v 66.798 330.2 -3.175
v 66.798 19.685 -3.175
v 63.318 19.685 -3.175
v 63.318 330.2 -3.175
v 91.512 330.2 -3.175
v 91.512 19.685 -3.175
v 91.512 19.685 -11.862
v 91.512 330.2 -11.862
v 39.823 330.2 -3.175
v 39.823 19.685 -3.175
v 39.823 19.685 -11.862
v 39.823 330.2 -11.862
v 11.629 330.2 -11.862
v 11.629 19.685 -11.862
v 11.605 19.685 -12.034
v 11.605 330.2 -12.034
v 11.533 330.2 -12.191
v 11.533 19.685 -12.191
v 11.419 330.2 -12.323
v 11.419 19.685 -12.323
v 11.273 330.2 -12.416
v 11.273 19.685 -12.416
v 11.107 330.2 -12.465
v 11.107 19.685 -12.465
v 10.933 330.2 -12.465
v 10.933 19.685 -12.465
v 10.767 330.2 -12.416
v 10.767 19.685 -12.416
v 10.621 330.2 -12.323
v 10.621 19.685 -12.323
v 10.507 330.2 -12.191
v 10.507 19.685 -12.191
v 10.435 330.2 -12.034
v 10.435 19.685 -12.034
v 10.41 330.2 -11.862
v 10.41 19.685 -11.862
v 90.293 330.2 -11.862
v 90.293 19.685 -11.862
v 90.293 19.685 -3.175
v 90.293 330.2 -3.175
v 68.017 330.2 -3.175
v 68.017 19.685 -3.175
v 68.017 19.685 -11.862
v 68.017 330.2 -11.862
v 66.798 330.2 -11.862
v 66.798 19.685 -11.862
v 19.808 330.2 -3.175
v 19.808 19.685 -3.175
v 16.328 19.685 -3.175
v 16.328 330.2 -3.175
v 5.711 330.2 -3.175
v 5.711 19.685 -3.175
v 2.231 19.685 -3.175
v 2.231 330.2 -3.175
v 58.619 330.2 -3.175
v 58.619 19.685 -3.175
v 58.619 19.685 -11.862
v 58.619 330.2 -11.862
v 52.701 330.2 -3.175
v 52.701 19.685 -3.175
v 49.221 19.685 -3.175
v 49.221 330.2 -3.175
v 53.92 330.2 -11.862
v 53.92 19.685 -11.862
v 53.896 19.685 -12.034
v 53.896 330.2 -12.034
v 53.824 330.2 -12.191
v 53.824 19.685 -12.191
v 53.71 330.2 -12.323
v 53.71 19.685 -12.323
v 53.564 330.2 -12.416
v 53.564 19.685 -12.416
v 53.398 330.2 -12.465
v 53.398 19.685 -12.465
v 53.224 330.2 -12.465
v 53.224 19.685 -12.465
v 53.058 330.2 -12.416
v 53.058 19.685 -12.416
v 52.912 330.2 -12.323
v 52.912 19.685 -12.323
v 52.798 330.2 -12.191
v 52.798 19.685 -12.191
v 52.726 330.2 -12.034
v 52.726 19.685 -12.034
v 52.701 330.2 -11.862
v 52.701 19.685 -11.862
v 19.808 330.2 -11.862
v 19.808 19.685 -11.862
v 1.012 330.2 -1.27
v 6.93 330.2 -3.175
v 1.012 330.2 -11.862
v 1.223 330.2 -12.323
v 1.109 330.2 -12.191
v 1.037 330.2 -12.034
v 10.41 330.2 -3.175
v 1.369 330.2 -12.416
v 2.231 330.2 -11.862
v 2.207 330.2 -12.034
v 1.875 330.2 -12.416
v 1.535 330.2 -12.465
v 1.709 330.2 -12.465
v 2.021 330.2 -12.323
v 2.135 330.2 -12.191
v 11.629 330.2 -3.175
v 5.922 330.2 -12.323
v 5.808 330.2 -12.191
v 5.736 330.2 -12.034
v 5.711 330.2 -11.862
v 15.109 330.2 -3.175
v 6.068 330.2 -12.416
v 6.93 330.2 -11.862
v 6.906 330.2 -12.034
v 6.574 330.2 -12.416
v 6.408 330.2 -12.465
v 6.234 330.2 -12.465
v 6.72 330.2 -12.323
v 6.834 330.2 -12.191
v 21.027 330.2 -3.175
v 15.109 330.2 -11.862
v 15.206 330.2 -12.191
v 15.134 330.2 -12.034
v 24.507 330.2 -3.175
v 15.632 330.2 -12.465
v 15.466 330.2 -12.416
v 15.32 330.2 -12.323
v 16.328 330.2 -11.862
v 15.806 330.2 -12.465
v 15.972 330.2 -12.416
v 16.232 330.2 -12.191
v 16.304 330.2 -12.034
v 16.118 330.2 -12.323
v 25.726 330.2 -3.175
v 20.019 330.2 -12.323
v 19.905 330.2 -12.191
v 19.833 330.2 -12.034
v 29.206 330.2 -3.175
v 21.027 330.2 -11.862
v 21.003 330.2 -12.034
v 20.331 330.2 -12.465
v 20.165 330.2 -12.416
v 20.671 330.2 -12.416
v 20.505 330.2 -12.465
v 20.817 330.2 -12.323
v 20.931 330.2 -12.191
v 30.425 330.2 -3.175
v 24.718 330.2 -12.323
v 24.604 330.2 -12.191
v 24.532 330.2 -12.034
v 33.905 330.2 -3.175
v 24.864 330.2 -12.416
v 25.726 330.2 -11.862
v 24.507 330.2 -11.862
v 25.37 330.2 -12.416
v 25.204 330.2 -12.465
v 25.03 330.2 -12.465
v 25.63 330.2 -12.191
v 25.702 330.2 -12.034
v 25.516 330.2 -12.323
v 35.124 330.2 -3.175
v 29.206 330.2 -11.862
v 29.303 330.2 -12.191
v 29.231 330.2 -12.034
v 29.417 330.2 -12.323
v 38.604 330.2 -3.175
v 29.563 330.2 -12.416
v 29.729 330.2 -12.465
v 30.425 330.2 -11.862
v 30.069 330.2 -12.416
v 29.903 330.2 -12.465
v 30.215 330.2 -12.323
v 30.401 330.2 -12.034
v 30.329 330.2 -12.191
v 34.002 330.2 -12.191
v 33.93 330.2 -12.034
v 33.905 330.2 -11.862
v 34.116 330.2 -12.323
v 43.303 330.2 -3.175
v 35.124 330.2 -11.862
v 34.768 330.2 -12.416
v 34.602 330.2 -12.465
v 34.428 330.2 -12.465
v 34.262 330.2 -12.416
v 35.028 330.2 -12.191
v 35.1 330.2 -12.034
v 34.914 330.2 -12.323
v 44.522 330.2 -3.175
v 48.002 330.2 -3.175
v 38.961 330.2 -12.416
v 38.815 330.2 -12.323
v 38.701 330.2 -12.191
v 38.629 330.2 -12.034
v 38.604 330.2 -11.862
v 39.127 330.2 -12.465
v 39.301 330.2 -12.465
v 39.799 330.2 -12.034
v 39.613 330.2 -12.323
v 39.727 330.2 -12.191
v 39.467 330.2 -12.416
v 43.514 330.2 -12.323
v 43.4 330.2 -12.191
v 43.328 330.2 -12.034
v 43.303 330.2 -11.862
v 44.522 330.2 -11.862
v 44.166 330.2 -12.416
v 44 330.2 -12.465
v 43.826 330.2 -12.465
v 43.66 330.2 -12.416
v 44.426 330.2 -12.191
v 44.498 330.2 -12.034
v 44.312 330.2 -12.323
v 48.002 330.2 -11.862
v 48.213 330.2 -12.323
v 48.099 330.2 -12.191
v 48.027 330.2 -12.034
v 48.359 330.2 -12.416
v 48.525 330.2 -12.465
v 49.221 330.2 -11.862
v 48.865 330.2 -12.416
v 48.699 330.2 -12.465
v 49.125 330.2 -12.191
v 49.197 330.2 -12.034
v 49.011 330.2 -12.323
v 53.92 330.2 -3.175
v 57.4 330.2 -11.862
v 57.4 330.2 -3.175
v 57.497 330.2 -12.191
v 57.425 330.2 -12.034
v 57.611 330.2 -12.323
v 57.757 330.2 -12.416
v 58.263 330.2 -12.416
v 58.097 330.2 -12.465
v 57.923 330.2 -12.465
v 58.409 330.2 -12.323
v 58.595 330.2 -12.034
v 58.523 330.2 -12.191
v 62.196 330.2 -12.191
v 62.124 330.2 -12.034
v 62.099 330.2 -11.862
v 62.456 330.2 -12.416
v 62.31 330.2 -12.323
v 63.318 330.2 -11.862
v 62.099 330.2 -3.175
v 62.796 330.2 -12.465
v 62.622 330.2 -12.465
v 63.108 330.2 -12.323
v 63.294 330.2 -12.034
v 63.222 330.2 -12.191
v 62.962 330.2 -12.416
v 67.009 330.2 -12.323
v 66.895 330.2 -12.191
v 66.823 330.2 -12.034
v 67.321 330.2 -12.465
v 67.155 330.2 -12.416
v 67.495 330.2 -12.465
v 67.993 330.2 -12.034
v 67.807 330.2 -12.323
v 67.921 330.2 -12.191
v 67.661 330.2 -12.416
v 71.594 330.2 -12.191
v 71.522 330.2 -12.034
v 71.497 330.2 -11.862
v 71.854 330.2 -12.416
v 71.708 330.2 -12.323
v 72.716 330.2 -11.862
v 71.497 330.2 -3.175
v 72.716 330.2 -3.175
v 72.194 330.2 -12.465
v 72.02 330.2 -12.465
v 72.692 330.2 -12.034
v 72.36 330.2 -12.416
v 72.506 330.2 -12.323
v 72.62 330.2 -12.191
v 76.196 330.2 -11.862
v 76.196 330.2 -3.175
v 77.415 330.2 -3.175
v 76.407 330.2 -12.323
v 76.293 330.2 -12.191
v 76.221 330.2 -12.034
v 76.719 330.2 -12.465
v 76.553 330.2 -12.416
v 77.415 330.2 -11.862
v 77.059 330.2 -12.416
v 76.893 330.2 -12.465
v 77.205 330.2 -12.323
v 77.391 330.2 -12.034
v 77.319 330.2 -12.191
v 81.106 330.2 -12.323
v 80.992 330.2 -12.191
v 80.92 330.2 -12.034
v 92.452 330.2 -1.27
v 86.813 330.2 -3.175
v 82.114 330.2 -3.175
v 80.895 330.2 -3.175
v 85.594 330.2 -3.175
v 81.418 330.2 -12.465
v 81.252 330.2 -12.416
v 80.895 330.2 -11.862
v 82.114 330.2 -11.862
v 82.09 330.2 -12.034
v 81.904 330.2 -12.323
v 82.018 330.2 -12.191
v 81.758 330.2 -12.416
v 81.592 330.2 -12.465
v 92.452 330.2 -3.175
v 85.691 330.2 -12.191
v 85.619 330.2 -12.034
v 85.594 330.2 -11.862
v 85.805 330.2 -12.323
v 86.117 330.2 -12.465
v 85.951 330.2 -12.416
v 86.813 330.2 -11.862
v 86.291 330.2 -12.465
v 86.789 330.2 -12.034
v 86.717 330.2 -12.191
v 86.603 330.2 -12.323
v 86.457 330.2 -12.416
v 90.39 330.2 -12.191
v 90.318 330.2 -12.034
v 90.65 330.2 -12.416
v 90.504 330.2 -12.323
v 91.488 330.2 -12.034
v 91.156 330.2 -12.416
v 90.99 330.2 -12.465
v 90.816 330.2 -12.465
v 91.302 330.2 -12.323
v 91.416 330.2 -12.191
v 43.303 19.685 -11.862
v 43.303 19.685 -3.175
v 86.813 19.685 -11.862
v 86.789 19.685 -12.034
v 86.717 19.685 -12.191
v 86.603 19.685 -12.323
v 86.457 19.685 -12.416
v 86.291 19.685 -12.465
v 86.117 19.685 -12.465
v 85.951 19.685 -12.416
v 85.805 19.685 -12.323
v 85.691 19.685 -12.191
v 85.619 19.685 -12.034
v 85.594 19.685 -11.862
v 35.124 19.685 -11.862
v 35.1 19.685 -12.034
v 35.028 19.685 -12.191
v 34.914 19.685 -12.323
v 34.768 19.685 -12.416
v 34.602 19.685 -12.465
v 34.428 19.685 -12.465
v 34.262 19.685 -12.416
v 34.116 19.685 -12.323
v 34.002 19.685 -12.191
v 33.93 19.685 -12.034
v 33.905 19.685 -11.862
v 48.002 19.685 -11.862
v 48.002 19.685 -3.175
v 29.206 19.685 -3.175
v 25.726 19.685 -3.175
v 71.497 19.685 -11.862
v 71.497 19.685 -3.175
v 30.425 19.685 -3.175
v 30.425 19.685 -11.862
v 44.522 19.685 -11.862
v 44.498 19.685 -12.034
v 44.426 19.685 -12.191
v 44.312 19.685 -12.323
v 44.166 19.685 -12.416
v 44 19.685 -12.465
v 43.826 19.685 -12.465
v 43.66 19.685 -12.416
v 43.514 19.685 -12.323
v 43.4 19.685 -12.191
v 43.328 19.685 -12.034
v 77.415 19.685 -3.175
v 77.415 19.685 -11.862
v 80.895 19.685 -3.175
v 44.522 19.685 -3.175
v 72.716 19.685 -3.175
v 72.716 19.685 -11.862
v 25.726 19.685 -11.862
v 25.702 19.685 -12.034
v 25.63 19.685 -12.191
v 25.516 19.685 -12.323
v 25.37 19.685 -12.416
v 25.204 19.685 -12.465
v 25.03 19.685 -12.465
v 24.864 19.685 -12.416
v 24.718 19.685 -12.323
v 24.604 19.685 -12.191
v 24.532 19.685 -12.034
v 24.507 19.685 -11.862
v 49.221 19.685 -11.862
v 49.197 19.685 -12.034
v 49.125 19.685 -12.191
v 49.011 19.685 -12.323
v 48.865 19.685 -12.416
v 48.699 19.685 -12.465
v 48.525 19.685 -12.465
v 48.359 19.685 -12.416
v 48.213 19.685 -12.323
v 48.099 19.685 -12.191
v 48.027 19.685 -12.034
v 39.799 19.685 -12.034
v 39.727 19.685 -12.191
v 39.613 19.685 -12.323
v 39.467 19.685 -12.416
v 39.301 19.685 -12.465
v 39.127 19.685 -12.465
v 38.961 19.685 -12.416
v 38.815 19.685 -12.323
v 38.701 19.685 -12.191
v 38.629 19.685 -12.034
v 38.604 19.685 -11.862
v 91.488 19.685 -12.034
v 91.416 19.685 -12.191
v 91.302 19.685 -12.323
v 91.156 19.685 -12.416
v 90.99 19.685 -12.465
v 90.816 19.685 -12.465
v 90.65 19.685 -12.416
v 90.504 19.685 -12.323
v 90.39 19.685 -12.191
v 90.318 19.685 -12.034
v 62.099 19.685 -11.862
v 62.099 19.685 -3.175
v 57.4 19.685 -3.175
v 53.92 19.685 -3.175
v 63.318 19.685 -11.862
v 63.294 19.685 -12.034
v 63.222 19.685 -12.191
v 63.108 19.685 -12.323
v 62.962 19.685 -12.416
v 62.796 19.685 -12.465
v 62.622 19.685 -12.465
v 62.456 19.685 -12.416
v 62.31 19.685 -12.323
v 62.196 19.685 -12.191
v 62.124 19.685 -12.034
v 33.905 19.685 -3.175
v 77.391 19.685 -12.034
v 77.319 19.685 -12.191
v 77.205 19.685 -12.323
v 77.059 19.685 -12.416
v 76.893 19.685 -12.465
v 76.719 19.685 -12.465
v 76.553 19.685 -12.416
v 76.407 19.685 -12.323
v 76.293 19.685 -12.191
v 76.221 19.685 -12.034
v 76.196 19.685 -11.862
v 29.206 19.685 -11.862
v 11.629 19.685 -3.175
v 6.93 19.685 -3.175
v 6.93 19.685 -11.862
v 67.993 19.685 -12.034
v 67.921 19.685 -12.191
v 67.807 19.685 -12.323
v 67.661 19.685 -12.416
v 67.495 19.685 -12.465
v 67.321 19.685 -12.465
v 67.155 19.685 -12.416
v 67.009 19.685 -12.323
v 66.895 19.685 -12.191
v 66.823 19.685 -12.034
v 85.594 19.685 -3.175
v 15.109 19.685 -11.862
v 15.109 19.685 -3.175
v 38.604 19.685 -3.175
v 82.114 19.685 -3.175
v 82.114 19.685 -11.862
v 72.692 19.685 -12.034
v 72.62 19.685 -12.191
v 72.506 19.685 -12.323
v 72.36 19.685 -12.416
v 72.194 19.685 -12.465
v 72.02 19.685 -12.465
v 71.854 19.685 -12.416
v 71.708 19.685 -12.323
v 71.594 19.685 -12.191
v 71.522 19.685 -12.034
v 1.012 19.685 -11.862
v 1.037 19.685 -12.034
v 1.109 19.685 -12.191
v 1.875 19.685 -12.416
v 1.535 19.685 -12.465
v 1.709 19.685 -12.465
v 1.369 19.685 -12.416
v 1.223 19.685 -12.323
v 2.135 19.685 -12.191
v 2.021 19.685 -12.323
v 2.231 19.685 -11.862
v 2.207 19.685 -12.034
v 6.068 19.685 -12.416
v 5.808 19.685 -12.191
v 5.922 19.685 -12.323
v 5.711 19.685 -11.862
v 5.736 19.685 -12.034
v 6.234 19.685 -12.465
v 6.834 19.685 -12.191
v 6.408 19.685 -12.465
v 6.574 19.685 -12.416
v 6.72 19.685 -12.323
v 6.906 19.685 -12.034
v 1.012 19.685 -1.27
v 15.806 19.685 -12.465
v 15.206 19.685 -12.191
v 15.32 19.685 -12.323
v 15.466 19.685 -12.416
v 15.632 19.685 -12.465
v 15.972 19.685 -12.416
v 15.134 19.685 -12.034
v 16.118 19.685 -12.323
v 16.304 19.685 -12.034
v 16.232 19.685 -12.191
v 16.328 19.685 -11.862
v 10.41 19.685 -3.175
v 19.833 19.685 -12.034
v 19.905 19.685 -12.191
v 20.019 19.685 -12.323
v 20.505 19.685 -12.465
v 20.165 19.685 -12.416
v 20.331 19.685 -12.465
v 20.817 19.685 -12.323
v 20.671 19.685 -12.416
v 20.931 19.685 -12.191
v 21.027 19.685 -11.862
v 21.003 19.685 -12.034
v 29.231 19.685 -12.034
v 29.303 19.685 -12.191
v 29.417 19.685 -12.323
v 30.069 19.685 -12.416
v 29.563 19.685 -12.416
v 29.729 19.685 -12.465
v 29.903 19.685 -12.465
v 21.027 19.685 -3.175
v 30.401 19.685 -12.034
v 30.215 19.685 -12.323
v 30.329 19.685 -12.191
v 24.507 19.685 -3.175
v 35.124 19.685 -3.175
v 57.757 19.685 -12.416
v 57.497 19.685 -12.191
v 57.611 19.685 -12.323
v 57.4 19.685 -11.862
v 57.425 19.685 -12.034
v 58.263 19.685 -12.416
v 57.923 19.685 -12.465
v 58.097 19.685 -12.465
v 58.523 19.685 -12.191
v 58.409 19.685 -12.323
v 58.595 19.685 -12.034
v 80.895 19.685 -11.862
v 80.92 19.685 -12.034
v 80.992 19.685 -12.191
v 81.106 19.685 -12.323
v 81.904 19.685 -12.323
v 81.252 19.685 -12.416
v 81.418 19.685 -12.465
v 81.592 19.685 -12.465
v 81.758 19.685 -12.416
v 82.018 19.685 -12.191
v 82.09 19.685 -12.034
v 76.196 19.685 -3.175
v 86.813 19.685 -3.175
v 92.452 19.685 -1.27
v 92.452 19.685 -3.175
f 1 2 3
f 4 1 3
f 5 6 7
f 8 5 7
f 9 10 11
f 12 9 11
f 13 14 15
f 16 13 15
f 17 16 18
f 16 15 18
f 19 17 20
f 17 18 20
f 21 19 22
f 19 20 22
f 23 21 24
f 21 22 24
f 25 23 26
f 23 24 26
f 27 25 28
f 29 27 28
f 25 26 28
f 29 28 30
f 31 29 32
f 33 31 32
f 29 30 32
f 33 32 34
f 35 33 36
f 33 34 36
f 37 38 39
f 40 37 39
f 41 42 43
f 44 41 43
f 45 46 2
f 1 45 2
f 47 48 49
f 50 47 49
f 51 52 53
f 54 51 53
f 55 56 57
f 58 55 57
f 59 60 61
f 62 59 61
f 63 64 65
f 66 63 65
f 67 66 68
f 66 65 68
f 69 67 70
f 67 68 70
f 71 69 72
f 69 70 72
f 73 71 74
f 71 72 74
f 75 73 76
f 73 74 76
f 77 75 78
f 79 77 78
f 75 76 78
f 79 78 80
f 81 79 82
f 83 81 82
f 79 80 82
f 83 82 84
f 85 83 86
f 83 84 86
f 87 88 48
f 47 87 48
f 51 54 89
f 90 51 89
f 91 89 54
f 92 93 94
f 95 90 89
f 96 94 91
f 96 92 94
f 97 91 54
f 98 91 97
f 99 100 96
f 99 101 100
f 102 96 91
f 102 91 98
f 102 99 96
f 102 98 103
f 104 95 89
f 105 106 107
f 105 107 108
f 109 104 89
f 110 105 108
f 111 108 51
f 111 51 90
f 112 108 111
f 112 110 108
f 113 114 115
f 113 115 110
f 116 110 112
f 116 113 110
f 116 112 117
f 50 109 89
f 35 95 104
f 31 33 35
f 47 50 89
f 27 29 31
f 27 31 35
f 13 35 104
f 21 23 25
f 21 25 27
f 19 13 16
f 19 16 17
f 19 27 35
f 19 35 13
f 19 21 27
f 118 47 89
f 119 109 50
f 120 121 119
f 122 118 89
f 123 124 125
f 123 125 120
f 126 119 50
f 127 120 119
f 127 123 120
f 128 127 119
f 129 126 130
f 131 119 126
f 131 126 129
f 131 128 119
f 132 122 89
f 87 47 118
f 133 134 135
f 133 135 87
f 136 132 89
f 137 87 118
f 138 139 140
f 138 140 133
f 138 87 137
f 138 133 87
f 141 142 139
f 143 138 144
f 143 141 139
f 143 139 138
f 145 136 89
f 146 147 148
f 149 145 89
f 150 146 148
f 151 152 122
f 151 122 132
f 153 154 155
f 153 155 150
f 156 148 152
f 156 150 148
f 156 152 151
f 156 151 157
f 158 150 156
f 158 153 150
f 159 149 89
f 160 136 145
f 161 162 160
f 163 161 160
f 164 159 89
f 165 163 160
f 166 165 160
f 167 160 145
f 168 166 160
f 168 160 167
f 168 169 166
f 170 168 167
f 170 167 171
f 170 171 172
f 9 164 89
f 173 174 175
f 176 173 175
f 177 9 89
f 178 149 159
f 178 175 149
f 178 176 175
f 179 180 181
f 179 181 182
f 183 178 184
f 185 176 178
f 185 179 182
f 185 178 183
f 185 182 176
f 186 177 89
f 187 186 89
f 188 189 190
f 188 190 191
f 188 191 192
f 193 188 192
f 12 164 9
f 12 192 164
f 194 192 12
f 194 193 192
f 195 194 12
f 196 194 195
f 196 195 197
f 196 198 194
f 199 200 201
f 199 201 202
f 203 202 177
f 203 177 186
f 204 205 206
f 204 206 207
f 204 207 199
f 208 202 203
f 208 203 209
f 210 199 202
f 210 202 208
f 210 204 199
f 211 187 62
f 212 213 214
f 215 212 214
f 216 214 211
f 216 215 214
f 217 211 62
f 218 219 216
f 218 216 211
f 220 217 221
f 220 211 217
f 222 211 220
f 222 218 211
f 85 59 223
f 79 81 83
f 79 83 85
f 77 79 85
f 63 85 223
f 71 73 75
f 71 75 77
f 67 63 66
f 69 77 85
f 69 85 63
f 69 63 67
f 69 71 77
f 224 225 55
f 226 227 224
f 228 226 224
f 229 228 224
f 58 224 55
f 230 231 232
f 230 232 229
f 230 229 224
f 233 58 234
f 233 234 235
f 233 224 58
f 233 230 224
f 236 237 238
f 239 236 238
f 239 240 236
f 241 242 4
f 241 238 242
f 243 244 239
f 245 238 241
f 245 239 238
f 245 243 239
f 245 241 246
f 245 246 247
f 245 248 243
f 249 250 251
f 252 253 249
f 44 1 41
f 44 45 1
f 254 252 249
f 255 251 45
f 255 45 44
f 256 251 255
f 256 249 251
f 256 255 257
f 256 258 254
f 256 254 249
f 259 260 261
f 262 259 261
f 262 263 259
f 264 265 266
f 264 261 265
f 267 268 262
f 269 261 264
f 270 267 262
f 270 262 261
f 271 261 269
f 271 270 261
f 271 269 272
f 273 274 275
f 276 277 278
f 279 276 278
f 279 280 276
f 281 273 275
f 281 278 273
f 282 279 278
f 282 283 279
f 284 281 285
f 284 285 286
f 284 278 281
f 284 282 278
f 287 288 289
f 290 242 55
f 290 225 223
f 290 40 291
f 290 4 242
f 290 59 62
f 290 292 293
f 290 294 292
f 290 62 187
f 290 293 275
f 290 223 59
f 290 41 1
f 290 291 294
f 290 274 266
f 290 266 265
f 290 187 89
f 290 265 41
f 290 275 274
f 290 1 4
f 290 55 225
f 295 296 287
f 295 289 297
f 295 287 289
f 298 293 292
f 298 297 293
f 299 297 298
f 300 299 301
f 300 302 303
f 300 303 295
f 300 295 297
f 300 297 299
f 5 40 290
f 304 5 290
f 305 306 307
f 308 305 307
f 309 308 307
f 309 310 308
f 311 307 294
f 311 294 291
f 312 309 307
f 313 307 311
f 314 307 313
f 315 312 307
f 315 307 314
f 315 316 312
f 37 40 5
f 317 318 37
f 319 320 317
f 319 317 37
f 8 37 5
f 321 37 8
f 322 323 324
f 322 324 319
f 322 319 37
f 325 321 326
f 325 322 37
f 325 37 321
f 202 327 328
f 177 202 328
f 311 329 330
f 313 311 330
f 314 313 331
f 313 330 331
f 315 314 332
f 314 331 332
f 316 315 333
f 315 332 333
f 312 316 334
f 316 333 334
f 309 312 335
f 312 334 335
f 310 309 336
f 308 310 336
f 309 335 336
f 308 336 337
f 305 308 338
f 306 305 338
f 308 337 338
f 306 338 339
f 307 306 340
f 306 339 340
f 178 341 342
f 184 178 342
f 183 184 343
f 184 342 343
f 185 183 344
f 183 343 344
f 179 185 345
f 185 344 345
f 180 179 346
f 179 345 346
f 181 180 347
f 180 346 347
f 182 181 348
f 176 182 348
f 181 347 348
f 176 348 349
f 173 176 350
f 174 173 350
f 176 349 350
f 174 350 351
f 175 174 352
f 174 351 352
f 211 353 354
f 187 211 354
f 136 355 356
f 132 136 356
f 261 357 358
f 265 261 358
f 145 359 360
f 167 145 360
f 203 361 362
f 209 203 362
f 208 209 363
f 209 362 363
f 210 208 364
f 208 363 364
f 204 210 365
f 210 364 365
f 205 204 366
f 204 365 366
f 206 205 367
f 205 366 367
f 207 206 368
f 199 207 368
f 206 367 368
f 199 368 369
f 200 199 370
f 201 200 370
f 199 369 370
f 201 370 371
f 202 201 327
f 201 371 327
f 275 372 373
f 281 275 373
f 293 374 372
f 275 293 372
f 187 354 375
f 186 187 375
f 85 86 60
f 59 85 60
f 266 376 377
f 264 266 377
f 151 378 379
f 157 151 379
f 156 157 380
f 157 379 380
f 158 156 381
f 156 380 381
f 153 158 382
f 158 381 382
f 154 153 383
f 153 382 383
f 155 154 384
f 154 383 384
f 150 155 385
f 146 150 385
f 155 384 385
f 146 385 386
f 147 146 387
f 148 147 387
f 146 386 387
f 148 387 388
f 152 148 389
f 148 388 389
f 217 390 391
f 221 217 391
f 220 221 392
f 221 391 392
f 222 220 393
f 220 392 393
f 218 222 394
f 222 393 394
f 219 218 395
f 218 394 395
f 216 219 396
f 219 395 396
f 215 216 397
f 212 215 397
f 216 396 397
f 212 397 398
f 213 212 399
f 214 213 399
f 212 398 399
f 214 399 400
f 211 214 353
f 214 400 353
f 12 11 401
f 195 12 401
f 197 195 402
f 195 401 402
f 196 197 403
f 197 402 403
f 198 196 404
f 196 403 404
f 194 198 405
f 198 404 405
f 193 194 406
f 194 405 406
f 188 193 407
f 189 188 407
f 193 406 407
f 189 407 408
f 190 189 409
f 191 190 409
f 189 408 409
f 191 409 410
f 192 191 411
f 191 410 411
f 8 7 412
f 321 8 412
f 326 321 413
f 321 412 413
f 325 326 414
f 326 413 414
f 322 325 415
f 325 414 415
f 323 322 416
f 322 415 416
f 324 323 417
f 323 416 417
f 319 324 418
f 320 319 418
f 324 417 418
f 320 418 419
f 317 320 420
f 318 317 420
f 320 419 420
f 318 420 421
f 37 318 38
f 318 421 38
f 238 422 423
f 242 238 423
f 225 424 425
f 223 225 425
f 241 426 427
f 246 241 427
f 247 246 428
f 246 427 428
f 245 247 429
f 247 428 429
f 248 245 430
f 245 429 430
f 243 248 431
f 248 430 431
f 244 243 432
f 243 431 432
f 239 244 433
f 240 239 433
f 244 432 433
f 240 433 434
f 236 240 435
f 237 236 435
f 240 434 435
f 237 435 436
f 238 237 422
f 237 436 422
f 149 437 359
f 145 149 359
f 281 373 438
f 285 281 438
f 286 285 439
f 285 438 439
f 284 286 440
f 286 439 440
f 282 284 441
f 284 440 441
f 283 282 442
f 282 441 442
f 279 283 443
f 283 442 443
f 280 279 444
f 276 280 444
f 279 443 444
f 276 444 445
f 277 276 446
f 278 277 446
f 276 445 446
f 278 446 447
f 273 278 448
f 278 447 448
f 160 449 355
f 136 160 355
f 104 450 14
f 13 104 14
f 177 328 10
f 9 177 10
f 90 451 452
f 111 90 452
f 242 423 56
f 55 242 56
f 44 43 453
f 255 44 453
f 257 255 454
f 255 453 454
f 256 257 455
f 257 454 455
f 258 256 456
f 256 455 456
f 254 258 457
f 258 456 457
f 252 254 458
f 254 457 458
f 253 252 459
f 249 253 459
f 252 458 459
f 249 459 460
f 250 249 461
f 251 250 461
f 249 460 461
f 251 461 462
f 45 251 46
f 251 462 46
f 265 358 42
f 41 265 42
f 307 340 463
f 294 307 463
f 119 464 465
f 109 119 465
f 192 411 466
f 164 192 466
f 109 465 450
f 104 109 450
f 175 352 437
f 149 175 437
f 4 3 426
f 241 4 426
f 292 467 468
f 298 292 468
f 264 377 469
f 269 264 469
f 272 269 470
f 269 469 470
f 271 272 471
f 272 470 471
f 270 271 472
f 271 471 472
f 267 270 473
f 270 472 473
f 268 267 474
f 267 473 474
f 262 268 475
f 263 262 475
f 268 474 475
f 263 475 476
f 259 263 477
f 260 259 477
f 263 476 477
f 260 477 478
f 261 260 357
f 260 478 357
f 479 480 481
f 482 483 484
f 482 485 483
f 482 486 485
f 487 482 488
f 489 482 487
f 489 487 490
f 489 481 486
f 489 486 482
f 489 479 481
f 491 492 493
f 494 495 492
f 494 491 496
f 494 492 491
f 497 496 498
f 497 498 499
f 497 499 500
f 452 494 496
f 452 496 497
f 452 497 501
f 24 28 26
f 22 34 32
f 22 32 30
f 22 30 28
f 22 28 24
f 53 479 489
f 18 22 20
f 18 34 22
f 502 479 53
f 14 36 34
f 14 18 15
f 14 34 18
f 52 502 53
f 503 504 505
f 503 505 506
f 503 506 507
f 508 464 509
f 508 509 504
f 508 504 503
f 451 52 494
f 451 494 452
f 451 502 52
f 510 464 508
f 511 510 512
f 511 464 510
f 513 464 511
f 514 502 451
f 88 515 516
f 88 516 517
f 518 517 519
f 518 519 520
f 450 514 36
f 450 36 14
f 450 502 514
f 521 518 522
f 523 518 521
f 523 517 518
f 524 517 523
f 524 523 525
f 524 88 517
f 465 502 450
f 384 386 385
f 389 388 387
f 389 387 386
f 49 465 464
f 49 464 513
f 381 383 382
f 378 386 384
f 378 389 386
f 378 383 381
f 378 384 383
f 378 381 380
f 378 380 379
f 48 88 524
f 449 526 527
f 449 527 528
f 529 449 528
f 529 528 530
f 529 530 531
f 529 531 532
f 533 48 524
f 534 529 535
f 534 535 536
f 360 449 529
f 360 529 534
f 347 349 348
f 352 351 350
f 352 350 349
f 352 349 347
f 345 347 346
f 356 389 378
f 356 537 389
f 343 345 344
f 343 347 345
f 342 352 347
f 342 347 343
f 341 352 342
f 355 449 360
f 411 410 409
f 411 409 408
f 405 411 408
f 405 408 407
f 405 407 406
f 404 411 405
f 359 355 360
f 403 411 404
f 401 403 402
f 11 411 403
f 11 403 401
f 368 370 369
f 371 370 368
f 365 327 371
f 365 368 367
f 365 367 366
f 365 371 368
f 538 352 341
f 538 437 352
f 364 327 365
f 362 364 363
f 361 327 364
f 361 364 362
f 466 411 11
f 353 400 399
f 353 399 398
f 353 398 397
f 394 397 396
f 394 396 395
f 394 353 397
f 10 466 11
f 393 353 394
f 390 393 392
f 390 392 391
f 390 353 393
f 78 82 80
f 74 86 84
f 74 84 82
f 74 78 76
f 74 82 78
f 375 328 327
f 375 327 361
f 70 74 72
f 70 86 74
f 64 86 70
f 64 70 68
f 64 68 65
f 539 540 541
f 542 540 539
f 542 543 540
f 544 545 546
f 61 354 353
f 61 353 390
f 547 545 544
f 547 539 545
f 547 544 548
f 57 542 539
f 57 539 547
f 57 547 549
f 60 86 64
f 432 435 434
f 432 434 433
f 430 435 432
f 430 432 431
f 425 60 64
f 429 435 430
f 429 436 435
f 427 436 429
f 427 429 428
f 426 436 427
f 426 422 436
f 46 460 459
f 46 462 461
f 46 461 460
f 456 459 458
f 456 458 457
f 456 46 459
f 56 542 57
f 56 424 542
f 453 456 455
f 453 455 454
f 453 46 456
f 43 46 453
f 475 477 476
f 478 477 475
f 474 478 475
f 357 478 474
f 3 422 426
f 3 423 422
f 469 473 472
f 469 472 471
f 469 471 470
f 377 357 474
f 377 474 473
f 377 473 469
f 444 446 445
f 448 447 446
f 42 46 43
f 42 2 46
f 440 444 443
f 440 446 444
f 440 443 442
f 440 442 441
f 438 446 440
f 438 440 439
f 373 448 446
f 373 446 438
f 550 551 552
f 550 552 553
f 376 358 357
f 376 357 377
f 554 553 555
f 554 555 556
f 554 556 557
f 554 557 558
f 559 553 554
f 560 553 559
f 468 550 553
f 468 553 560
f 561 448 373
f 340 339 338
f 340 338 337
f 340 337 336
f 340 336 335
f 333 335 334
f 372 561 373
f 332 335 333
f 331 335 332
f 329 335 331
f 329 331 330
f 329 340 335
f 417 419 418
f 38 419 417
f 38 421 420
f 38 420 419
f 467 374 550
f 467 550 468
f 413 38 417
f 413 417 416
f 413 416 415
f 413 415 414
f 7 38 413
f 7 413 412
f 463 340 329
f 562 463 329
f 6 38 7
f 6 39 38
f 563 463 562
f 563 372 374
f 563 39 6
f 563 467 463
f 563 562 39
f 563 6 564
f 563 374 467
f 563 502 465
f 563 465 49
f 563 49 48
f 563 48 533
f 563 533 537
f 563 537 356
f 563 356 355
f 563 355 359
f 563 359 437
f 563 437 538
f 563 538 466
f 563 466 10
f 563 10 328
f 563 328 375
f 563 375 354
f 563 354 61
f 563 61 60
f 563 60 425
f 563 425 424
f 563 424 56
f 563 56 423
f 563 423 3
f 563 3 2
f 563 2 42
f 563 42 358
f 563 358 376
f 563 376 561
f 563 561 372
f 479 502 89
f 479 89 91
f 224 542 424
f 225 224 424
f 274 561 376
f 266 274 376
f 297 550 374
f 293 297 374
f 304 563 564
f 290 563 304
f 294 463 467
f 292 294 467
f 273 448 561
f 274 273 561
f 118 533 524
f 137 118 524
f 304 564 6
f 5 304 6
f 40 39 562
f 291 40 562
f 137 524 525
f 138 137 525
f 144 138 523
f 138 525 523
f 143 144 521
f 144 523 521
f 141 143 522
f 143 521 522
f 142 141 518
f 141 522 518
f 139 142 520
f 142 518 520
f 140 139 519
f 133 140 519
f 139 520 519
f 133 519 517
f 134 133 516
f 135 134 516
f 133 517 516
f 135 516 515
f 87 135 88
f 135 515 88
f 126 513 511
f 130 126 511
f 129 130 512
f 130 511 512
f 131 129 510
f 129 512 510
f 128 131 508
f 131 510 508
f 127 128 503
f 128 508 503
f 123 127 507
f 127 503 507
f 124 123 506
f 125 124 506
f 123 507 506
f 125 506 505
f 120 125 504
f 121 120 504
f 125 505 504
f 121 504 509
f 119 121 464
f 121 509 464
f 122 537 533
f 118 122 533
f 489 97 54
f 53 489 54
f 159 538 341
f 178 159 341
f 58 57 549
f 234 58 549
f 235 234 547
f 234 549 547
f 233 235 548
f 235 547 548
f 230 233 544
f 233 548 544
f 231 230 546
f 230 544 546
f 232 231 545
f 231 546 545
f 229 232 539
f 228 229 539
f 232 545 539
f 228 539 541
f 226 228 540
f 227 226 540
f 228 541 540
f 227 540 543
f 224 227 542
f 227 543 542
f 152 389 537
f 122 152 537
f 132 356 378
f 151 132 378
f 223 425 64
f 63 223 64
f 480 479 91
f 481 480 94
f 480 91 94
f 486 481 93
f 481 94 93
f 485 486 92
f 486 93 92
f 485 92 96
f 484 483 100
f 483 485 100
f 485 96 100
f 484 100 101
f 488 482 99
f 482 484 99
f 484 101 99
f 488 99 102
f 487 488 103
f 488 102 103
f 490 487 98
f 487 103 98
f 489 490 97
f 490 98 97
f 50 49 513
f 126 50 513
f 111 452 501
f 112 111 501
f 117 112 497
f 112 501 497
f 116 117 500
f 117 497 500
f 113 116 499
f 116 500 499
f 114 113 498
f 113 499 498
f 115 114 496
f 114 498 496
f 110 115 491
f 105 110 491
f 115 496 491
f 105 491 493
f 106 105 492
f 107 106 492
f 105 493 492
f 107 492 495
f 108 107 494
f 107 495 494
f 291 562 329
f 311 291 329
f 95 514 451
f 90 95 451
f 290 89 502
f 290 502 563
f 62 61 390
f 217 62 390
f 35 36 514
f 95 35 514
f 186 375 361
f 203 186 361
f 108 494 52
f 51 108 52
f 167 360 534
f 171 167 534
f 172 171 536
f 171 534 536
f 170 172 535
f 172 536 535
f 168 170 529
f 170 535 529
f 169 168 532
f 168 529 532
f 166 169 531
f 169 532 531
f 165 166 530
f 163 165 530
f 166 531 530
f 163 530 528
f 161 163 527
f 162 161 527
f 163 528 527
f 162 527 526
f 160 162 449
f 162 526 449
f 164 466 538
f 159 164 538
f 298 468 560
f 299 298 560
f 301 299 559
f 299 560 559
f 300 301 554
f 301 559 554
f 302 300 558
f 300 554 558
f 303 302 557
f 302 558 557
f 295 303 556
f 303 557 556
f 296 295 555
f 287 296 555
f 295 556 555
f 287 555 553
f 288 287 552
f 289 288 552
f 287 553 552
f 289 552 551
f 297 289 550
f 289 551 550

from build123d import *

# Parameters (mm, degrees)
BOSS_EXTRUDE1_DEPTH   = 330.2
BOSS_EXTRUDE2_DEPTH   = 330.2
SKETCH_PATTERN1_DEPTH = 330.2
SKETCH5_W             = 0.4826
SKETCH5_H             = 3.175
BOSS_EXTRUDE3_DEPTH   = 254
SKETCH10_OUTSIDE_W    = 282.866
SKETCH10_OUTSIDE_H    = 409.79
SKETCH10_OUTSIDE_W_2  = 91.44
SKETCH10_OUTSIDE_H_2  = 330.2
CUT_EXTRUDE3_DEPTH    = 389.485949469
SKETCH11_OUTSIDE_W    = 162.01
SKETCH11_OUTSIDE_H    = 400.77
SKETCH11_OUTSIDE_W_2  = 91.44
SKETCH11_OUTSIDE_H_2  = 310.515
CUT_EXTRUDE4_DEPTH    = 344.125324268
SKETCH12_W            = 91.44
SKETCH12_H            = 310.515
CUT_EXTRUDE5_DEPTH    = 1.27


# Read off the part's stored shape, not the designer's step: Sketch-Pattern1
with BuildPart() as part:
    # Sketch1 → Boss-Extrude1 (new body)
    with BuildSketch(Plane(origin=(0, 0, 0), x_dir=(1, 0, 0), z_dir=(0, 1, 0))):
        Polygon((1.012216501, 3.175), (1.012216501, 0), (203.805816501, 0), (203.805816501, 3.175), (2.231416501, 3.175), align=None)
    extrude(amount=BOSS_EXTRUDE1_DEPTH)

    # Sketch3 → Boss-Extrude2 (add, through all)
    with BuildSketch(Plane(origin=(0, 330.2, 0), x_dir=(1, 0, 0), z_dir=(0, 1, 0))):
        with BuildLine():
            Line((1.012216501, 3.175), (1.012216501, 11.8618))
            ThreePointArc((1.012216501, 11.8618), (1.621816501, 12.4714), (2.231416501, 11.8618))
            Line((2.231416501, 11.8618), (2.231416501, 3.175))
            Line((2.231416501, 3.175), (1.012216501, 3.175))
        make_face()
    extrude(amount=-BOSS_EXTRUDE2_DEPTH)

    # Sketch-Pattern1 outline → Sketch-Pattern1 (add)
    with BuildSketch(Plane(origin=(0, 0, 0), x_dir=(1, 0, 0), z_dir=(0, 1, 0))):
        with BuildLine():
            Line((6.930416501, 3.175), (6.930416501, 11.8618))
            ThreePointArc((6.930416501, 11.8618), (6.320816501, 12.4714), (5.711216501, 11.8618))
            Line((5.711216501, 11.8618), (5.711216501, 3.175))
            Line((5.711216501, 3.175), (6.930416501, 3.175))
        make_face()
        with BuildLine():
            Line((203.069216501, 11.8618), (203.069216501, 3.175))
            Line((203.069216501, 3.175), (204.288416501, 3.175))
            Line((204.288416501, 3.175), (204.288416501, 11.8618))
            ThreePointArc((204.288416501, 11.8618), (203.678816501, 12.4714), (203.069216501, 11.8618))
        make_face()
        with BuildLine():
            Line((198.370216501, 11.8618), (198.370216501, 3.175))
            Line((198.370216501, 3.175), (199.589416501, 3.175))
            Line((199.589416501, 3.175), (199.589416501, 11.8618))
            ThreePointArc((199.589416501, 11.8618), (198.979816501, 12.4714), (198.370216501, 11.8618))
        make_face()
        with BuildLine():
            Line((193.671216501, 11.8618), (193.671216501, 3.175))
            Line((193.671216501, 3.175), (194.890416501, 3.175))
            Line((194.890416501, 3.175), (194.890416501, 11.8618))
            ThreePointArc((194.890416501, 11.8618), (194.280816501, 12.4714), (193.671216501, 11.8618))
        make_face()
        with BuildLine():
            Line((188.972216501, 11.8618), (188.972216501, 3.175))
            Line((188.972216501, 3.175), (190.191416501, 3.175))
            Line((190.191416501, 3.175), (190.191416501, 11.8618))
            ThreePointArc((190.191416501, 11.8618), (189.581816501, 12.4714), (188.972216501, 11.8618))
        make_face()
        with BuildLine():
            Line((184.273216501, 11.8618), (184.273216501, 3.175))
            Line((184.273216501, 3.175), (185.492416501, 3.175))
            Line((185.492416501, 3.175), (185.492416501, 11.8618))
            ThreePointArc((185.492416501, 11.8618), (184.882816501, 12.4714), (184.273216501, 11.8618))
        make_face()
        with BuildLine():
            Line((179.574216501, 11.8618), (179.574216501, 3.175))
            Line((179.574216501, 3.175), (180.793416501, 3.175))
            Line((180.793416501, 3.175), (180.793416501, 11.8618))
            ThreePointArc((180.793416501, 11.8618), (180.183816501, 12.4714), (179.574216501, 11.8618))
        make_face()
        with BuildLine():
            Line((174.875216501, 11.8618), (174.875216501, 3.175))
            Line((174.875216501, 3.175), (176.094416501, 3.175))
            Line((176.094416501, 3.175), (176.094416501, 11.8618))
            ThreePointArc((176.094416501, 11.8618), (175.484816501, 12.4714), (174.875216501, 11.8618))
        make_face()
        with BuildLine():
            Line((170.176216501, 11.8618), (170.176216501, 3.175))
            Line((170.176216501, 3.175), (171.395416501, 3.175))
            Line((171.395416501, 3.175), (171.395416501, 11.8618))
            ThreePointArc((171.395416501, 11.8618), (170.785816501, 12.4714), (170.176216501, 11.8618))
        make_face()
        with BuildLine():
            Line((165.477216501, 11.8618), (165.477216501, 3.175))
            Line((165.477216501, 3.175), (166.696416501, 3.175))
            Line((166.696416501, 3.175), (166.696416501, 11.8618))
            ThreePointArc((166.696416501, 11.8618), (166.086816501, 12.4714), (165.477216501, 11.8618))
        make_face()
        with BuildLine():
            Line((160.778216501, 11.8618), (160.778216501, 3.175))
            Line((160.778216501, 3.175), (161.997416501, 3.175))
            Line((161.997416501, 3.175), (161.997416501, 11.8618))
            ThreePointArc((161.997416501, 11.8618), (161.387816501, 12.4714), (160.778216501, 11.8618))
        make_face()
        with BuildLine():
            Line((156.079216501, 11.8618), (156.079216501, 3.175))
            Line((156.079216501, 3.175), (157.298416501, 3.175))
            Line((157.298416501, 3.175), (157.298416501, 11.8618))
            ThreePointArc((157.298416501, 11.8618), (156.688816501, 12.4714), (156.079216501, 11.8618))
        make_face()
        with BuildLine():
            Line((151.380216501, 11.8618), (151.380216501, 3.175))
            Line((151.380216501, 3.175), (152.599416501, 3.175))
            Line((152.599416501, 3.175), (152.599416501, 11.8618))
            ThreePointArc((152.599416501, 11.8618), (151.989816501, 12.4714), (151.380216501, 11.8618))
        make_face()
        with BuildLine():
            Line((146.681216501, 11.8618), (146.681216501, 3.175))
            Line((146.681216501, 3.175), (147.900416501, 3.175))
            Line((147.900416501, 3.175), (147.900416501, 11.8618))
            ThreePointArc((147.900416501, 11.8618), (147.290816501, 12.4714), (146.681216501, 11.8618))
        make_face()
        with BuildLine():
            Line((141.982216501, 11.8618), (141.982216501, 3.175))
            Line((141.982216501, 3.175), (143.201416501, 3.175))
            Line((143.201416501, 3.175), (143.201416501, 11.8618))
            ThreePointArc((143.201416501, 11.8618), (142.591816501, 12.4714), (141.982216501, 11.8618))
        make_face()
        with BuildLine():
            Line((137.283216501, 11.8618), (137.283216501, 3.175))
            Line((137.283216501, 3.175), (138.502416501, 3.175))
            Line((138.502416501, 3.175), (138.502416501, 11.8618))
            ThreePointArc((138.502416501, 11.8618), (137.892816501, 12.4714), (137.283216501, 11.8618))
        make_face()
        with BuildLine():
            Line((132.584216501, 11.8618), (132.584216501, 3.175))
            Line((132.584216501, 3.175), (133.803416501, 3.175))
            Line((133.803416501, 3.175), (133.803416501, 11.8618))
            ThreePointArc((133.803416501, 11.8618), (133.193816501, 12.4714), (132.584216501, 11.8618))
        make_face()
        with BuildLine():
            Line((127.885216501, 11.8618), (127.885216501, 3.175))
            Line((127.885216501, 3.175), (129.104416501, 3.175))
            Line((129.104416501, 3.175), (129.104416501, 11.8618))
            ThreePointArc((129.104416501, 11.8618), (128.494816501, 12.4714), (127.885216501, 11.8618))
        make_face()
        with BuildLine():
            Line((123.186216501, 11.8618), (123.186216501, 3.175))
            Line((123.186216501, 3.175), (124.405416501, 3.175))
            Line((124.405416501, 3.175), (124.405416501, 11.8618))
            ThreePointArc((124.405416501, 11.8618), (123.795816501, 12.4714), (123.186216501, 11.8618))
        make_face()
        with BuildLine():
            Line((118.487216501, 11.8618), (118.487216501, 3.175))
            Line((118.487216501, 3.175), (119.706416501, 3.175))
            Line((119.706416501, 3.175), (119.706416501, 11.8618))
            ThreePointArc((119.706416501, 11.8618), (119.096816501, 12.4714), (118.487216501, 11.8618))
        make_face()
        with BuildLine():
            Line((113.788216501, 11.8618), (113.788216501, 3.175))
            Line((113.788216501, 3.175), (115.007416501, 3.175))
            Line((115.007416501, 3.175), (115.007416501, 11.8618))
            ThreePointArc((115.007416501, 11.8618), (114.397816501, 12.4714), (113.788216501, 11.8618))
        make_face()
        with BuildLine():
            Line((109.089216501, 11.8618), (109.089216501, 3.175))
            Line((109.089216501, 3.175), (110.308416501, 3.175))
            Line((110.308416501, 3.175), (110.308416501, 11.8618))
            ThreePointArc((110.308416501, 11.8618), (109.698816501, 12.4714), (109.089216501, 11.8618))
        make_face()
        with BuildLine():
            Line((104.390216501, 11.8618), (104.390216501, 3.175))
            Line((104.390216501, 3.175), (105.609416501, 3.175))
            Line((105.609416501, 3.175), (105.609416501, 11.8618))
            ThreePointArc((105.609416501, 11.8618), (104.999816501, 12.4714), (104.390216501, 11.8618))
        make_face()
        with BuildLine():
            Line((99.691216501, 11.8618), (99.691216501, 3.175))
            Line((99.691216501, 3.175), (100.910416501, 3.175))
            Line((100.910416501, 3.175), (100.910416501, 11.8618))
            ThreePointArc((100.910416501, 11.8618), (100.300816501, 12.4714), (99.691216501, 11.8618))
        make_face()
        with BuildLine():
            Line((94.992216501, 11.8618), (94.992216501, 3.175))
            Line((94.992216501, 3.175), (96.211416501, 3.175))
            Line((96.211416501, 3.175), (96.211416501, 11.8618))
            ThreePointArc((96.211416501, 11.8618), (95.601816501, 12.4714), (94.992216501, 11.8618))
        make_face()
        with BuildLine():
            Line((90.293216501, 11.8618), (90.293216501, 3.175))
            Line((90.293216501, 3.175), (91.512416501, 3.175))
            Line((91.512416501, 3.175), (91.512416501, 11.8618))
            ThreePointArc((91.512416501, 11.8618), (90.902816501, 12.4714), (90.293216501, 11.8618))
        make_face()
        with BuildLine():
            Line((85.594216501, 11.8618), (85.594216501, 3.175))
            Line((85.594216501, 3.175), (86.813416501, 3.175))
            Line((86.813416501, 3.175), (86.813416501, 11.8618))
            ThreePointArc((86.813416501, 11.8618), (86.203816501, 12.4714), (85.594216501, 11.8618))
        make_face()
        with BuildLine():
            Line((80.895216501, 11.8618), (80.895216501, 3.175))
            Line((80.895216501, 3.175), (82.114416501, 3.175))
            Line((82.114416501, 3.175), (82.114416501, 11.8618))
            ThreePointArc((82.114416501, 11.8618), (81.504816501, 12.4714), (80.895216501, 11.8618))
        make_face()
        with BuildLine():
            Line((76.196216501, 11.8618), (76.196216501, 3.175))
            Line((76.196216501, 3.175), (77.415416501, 3.175))
            Line((77.415416501, 3.175), (77.415416501, 11.8618))
            ThreePointArc((77.415416501, 11.8618), (76.805816501, 12.4714), (76.196216501, 11.8618))
        make_face()
        with BuildLine():
            Line((71.497216501, 11.8618), (71.497216501, 3.175))
            Line((71.497216501, 3.175), (72.716416501, 3.175))
            Line((72.716416501, 3.175), (72.716416501, 11.8618))
            ThreePointArc((72.716416501, 11.8618), (72.106816501, 12.4714), (71.497216501, 11.8618))
        make_face()
        with BuildLine():
            Line((66.798216501, 11.8618), (66.798216501, 3.175))
            Line((66.798216501, 3.175), (68.017416501, 3.175))
            Line((68.017416501, 3.175), (68.017416501, 11.8618))
            ThreePointArc((68.017416501, 11.8618), (67.407816501, 12.4714), (66.798216501, 11.8618))
        make_face()
        with BuildLine():
            Line((62.099216501, 11.8618), (62.099216501, 3.175))
            Line((62.099216501, 3.175), (63.318416501, 3.175))
            Line((63.318416501, 3.175), (63.318416501, 11.8618))
            ThreePointArc((63.318416501, 11.8618), (62.708816501, 12.4714), (62.099216501, 11.8618))
        make_face()
        with BuildLine():
            Line((57.400216501, 11.8618), (57.400216501, 3.175))
            Line((57.400216501, 3.175), (58.619416501, 3.175))
            Line((58.619416501, 3.175), (58.619416501, 11.8618))
            ThreePointArc((58.619416501, 11.8618), (58.009816501, 12.4714), (57.400216501, 11.8618))
        make_face()
        with BuildLine():
            Line((52.701216501, 11.8618), (52.701216501, 3.175))
            Line((52.701216501, 3.175), (53.920416501, 3.175))
            Line((53.920416501, 3.175), (53.920416501, 11.8618))
            ThreePointArc((53.920416501, 11.8618), (53.310816501, 12.4714), (52.701216501, 11.8618))
        make_face()
        with BuildLine():
            Line((48.002216501, 11.8618), (48.002216501, 3.175))
            Line((48.002216501, 3.175), (49.221416501, 3.175))
            Line((49.221416501, 3.175), (49.221416501, 11.8618))
            ThreePointArc((49.221416501, 11.8618), (48.611816501, 12.4714), (48.002216501, 11.8618))
        make_face()
        with BuildLine():
            Line((43.303216501, 11.8618), (43.303216501, 3.175))
            Line((43.303216501, 3.175), (44.522416501, 3.175))
            Line((44.522416501, 3.175), (44.522416501, 11.8618))
            ThreePointArc((44.522416501, 11.8618), (43.912816501, 12.4714), (43.303216501, 11.8618))
        make_face()
        with BuildLine():
            Line((38.604216501, 11.8618), (38.604216501, 3.175))
            Line((38.604216501, 3.175), (39.823416501, 3.175))
            Line((39.823416501, 3.175), (39.823416501, 11.8618))
            ThreePointArc((39.823416501, 11.8618), (39.213816501, 12.4714), (38.604216501, 11.8618))
        make_face()
        with BuildLine():
            Line((33.905216501, 11.8618), (33.905216501, 3.175))
            Line((33.905216501, 3.175), (35.124416501, 3.175))
            Line((35.124416501, 3.175), (35.124416501, 11.8618))
            ThreePointArc((35.124416501, 11.8618), (34.514816501, 12.4714), (33.905216501, 11.8618))
        make_face()
        with BuildLine():
            Line((29.206216501, 11.8618), (29.206216501, 3.175))
            Line((29.206216501, 3.175), (30.425416501, 3.175))
            Line((30.425416501, 3.175), (30.425416501, 11.8618))
            ThreePointArc((30.425416501, 11.8618), (29.815816501, 12.4714), (29.206216501, 11.8618))
        make_face()
        with BuildLine():
            Line((24.507216501, 11.8618), (24.507216501, 3.175))
            Line((24.507216501, 3.175), (25.726416501, 3.175))
            Line((25.726416501, 3.175), (25.726416501, 11.8618))
            ThreePointArc((25.726416501, 11.8618), (25.116816501, 12.4714), (24.507216501, 11.8618))
        make_face()
        with BuildLine():
            Line((19.808216501, 11.8618), (19.808216501, 3.175))
            Line((19.808216501, 3.175), (21.027416501, 3.175))
            Line((21.027416501, 3.175), (21.027416501, 11.8618))
            ThreePointArc((21.027416501, 11.8618), (20.417816501, 12.4714), (19.808216501, 11.8618))
        make_face()
        with BuildLine():
            Line((15.109216501, 11.8618), (15.109216501, 3.175))
            Line((15.109216501, 3.175), (16.328416501, 3.175))
            Line((16.328416501, 3.175), (16.328416501, 11.8618))
            ThreePointArc((16.328416501, 11.8618), (15.718816501, 12.4714), (15.109216501, 11.8618))
        make_face()
        with BuildLine():
            Line((10.410216501, 11.8618), (10.410216501, 3.175))
            Line((10.410216501, 3.175), (11.629416501, 3.175))
            Line((11.629416501, 3.175), (11.629416501, 11.8618))
            ThreePointArc((11.629416501, 11.8618), (11.019816501, 12.4714), (10.410216501, 11.8618))
        make_face()
    extrude(amount=SKETCH_PATTERN1_DEPTH)

    # Sketch5 → Boss-Extrude3 (add)
    with BuildSketch(Plane(origin=(0, 330.2, 0), x_dir=(1, 0, 0), z_dir=(0, 1, 0))):
        with Locations((204.047116501, 1.5875)):
            Rectangle(SKETCH5_W, SKETCH5_H)
    extrude(amount=-BOSS_EXTRUDE3_DEPTH)

    # Sketch10 outside → Cut-Extrude3 (cut, through all)
    with BuildSketch(Plane.XY):
        with Locations((102.65, 165.1)):
            Rectangle(SKETCH10_OUTSIDE_W, SKETCH10_OUTSIDE_H)
        with Locations((46.732216501, 165.1)):
            Rectangle(SKETCH10_OUTSIDE_W_2, SKETCH10_OUTSIDE_H_2, mode=Mode.SUBTRACT)
    extrude(amount=-CUT_EXTRUDE3_DEPTH, mode=Mode.SUBTRACT)

    # Sketch11 outside → Cut-Extrude4 (cut, through all)
    with BuildSketch(Plane.XY):
        with Locations((46.732, 165.1)):
            Rectangle(SKETCH11_OUTSIDE_W, SKETCH11_OUTSIDE_H)
        with Locations((46.732216501, 174.9425)):
            Rectangle(SKETCH11_OUTSIDE_W_2, SKETCH11_OUTSIDE_H_2, mode=Mode.SUBTRACT)
    extrude(amount=-CUT_EXTRUDE4_DEPTH, mode=Mode.SUBTRACT)

    # Sketch12 → Cut-Extrude5 (cut)
    with BuildSketch(Plane.XY):
        with Locations((46.732216501, 174.9425)):
            Rectangle(SKETCH12_W, SKETCH12_H)
    extrude(amount=-CUT_EXTRUDE5_DEPTH, mode=Mode.SUBTRACT)


solid = part.part
